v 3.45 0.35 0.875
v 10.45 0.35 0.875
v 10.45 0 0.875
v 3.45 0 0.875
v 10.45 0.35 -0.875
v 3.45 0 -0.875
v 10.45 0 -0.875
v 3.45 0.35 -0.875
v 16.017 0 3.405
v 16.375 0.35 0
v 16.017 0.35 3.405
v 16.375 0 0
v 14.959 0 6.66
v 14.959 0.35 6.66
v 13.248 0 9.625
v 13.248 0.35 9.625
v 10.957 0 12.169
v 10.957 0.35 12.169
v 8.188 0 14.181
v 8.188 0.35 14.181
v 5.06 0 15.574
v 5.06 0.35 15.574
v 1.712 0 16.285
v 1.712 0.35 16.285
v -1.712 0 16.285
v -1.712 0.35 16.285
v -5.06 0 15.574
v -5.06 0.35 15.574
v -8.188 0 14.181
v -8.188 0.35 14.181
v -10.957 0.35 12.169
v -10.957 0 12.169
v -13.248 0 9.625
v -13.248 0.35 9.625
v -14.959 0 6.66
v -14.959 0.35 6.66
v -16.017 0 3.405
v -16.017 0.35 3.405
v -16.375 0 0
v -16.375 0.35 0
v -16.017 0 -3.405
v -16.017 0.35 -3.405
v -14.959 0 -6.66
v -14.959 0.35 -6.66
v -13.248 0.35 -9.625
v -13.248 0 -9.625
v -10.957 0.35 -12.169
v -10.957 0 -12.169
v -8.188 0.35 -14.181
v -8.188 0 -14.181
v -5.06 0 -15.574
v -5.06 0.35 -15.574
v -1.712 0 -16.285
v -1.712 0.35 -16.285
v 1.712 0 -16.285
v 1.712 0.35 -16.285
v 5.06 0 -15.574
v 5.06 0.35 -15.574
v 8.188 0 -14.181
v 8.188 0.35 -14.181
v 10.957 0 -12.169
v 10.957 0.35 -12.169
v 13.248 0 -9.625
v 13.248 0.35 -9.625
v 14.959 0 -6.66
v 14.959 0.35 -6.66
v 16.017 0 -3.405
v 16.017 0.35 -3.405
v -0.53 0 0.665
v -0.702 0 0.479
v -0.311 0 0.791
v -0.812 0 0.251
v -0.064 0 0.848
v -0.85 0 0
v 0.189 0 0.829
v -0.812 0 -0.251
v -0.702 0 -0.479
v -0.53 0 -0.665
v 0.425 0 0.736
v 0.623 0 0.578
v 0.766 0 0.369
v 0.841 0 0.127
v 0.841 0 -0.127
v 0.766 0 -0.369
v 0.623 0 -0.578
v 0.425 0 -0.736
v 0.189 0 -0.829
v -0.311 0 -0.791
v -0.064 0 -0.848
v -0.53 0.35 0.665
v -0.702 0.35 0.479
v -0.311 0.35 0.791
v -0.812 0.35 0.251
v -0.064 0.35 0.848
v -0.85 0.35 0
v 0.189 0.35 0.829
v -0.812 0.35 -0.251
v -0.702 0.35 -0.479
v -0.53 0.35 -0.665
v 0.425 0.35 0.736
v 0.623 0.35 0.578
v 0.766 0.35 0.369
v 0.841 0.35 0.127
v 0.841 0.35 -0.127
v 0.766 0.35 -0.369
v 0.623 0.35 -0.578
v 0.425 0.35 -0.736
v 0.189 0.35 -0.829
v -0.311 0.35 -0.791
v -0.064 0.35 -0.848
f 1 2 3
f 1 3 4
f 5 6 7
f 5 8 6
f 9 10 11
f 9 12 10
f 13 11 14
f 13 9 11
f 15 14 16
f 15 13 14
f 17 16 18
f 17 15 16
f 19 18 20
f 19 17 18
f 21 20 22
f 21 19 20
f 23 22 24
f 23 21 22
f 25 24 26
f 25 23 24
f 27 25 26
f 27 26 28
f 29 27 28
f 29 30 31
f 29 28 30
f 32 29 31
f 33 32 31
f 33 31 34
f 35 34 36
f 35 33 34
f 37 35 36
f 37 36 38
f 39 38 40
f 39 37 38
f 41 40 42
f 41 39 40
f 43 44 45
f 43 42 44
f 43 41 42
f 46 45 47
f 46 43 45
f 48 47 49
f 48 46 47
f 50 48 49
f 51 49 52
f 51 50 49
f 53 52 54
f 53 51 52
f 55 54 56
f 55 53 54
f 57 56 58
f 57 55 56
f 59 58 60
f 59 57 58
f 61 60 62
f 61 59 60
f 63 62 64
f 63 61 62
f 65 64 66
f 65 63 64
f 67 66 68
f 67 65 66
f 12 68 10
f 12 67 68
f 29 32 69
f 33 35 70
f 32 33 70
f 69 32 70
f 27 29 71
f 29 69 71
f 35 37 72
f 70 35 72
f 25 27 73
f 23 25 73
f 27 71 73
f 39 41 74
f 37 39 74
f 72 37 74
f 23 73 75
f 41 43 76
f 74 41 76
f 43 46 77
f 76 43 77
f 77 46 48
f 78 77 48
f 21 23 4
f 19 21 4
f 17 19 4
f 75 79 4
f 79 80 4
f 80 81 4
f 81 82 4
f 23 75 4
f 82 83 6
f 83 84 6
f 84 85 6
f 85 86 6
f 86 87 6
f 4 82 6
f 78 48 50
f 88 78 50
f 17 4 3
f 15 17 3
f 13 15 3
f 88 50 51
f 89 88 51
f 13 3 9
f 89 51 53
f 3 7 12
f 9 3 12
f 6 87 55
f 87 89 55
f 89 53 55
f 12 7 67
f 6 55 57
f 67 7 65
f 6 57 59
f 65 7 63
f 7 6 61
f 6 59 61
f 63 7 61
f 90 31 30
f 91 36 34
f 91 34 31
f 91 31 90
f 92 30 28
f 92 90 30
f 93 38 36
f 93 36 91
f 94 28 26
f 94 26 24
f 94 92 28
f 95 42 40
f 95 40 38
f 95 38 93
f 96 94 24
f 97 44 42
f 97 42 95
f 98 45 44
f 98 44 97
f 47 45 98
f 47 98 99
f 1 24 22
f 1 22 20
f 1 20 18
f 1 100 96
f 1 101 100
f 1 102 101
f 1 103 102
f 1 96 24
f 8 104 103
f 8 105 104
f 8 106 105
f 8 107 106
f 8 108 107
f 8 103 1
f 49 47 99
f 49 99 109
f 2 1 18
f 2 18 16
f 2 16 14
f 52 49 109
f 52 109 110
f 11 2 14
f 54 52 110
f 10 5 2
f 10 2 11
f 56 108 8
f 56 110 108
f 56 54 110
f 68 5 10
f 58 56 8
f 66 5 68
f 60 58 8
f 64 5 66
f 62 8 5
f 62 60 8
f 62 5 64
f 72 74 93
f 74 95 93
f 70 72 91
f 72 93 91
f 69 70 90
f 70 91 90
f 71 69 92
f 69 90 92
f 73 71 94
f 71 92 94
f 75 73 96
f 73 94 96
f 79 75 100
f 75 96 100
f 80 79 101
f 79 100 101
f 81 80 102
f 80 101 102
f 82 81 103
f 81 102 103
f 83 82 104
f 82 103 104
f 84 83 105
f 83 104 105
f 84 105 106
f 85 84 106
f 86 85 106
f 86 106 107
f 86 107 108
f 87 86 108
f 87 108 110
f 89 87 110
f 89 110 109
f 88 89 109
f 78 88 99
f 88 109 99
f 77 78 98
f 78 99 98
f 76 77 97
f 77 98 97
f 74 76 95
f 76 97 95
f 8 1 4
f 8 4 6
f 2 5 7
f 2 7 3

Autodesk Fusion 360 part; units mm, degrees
sketch "Sketch4" plane through (0, 0, 0) normal (0, 1, 0) x (1, 0, 0)
  circle A0 centre (0, 0) radius 16.375
  dimension "d2" = 32.75
extrude "Extrude1" add sketch "Sketch4" along normal blind 0.35
sketch "Sketch5" plane through (0, 0.35, 0) normal (0, 1, 0) x (-1, 0, 0)
  circle A0 centre (0, 0) radius 16.375
  circle A1 centre (0, 0) radius 0.85
  line L0 (-3.45, -0.875) -> (-10.45, -0.875)
  line L1 (-10.45, -0.875) -> (-10.45, 0.875)
  line L2 (-10.45, 0.875) -> (-3.45, 0.875)
  line L3 (-3.45, 0.875) -> (-3.45, -0.875)
  dimension "d11" = 1.7
  dimension "d12" = 7
  dimension "d14" = 1.75
  dimension "d15" = 3.45
  dimension "d16" = 0.875
extrude "Extrude2" cut sketch "Sketch5" against normal through all contours A1 | L0 L1 L2 L3
sketch "Sketch7" plane through (0, 0.35, 0) normal (0, 1, 0) x (-1, 0, 0)
  circle A0 centre (0, 0) radius 0.85
  line L0 (-3.45, 0.875) -> (-3.45, -0.875)
  line L1 (-3.45, -0.875) -> (-10.45, -0.875)
  line L2 (-10.45, -0.875) -> (-10.45, 0.875)
  line L3 (-10.45, 0.875) -> (-3.45, 0.875)
  circle A1 centre (0, 0) radius 16.375
  line L4 (0.375, 12.5) -> (-0.375, 12.5)
  line L5 (-0.375, 12.5) -> (-0.375, 14.5)
  line L6 (-0.375, 14.5) -> (0.375, 14.5)
  line L7 (0.375, 14.5) -> (0.375, 12.5)
  circle A2 centre (0, 0) radius 15.5
  line L8 (-6.5748, 10.6378) -> (-7.5748, 12.3699)
  line L9 (-6.9252, 12.7449) -> (-5.9252, 11.0128)
  line L10 (-5.9252, 11.0128) -> (-6.5748, 10.6378)
  line L11 (-7.5748, 12.3699) -> (-6.9252, 12.7449)
  line L12 (-11.0128, 5.9252) -> (-12.7449, 6.9252)
  line L13 (-12.3699, 7.5748) -> (-10.6378, 6.5748)
  line L14 (-10.6378, 6.5748) -> (-11.0128, 5.9252)
  line L15 (-12.7449, 6.9252) -> (-12.3699, 7.5748)
  line L16 (-10.6378, -6.5748) -> (-12.3699, -7.5748)
  line L17 (-12.7449, -6.9252) -> (-11.0128, -5.9252)
  line L18 (-11.0128, -5.9252) -> (-10.6378, -6.5748)
  line L19 (-12.3699, -7.5748) -> (-12.7449, -6.9252)
  line L20 (-5.9252, -11.0128) -> (-6.9252, -12.7449)
  line L21 (-7.5748, -12.3699) -> (-6.5748, -10.6378)
  line L22 (-6.5748, -10.6378) -> (-5.9252, -11.0128)
  line L23 (-6.9252, -12.7449) -> (-7.5748, -12.3699)
  line L24 (6.5748, -10.6378) -> (7.5748, -12.3699)
  line L25 (6.9252, -12.7449) -> (5.9252, -11.0128)
  line L26 (5.9252, -11.0128) -> (6.5748, -10.6378)
  line L27 (7.5748, -12.3699) -> (6.9252, -12.7449)
  line L28 (11.0128, -5.9252) -> (12.7449, -6.9252)
  line L29 (12.3699, -7.5748) -> (10.6378, -6.5748)
  line L30 (10.6378, -6.5748) -> (11.0128, -5.9252)
  line L31 (12.7449, -6.9252) -> (12.3699, -7.5748)
  line L32 (10.6378, 6.5748) -> (12.3699, 7.5748)
  line L33 (12.7449, 6.9252) -> (11.0128, 5.9252)
  line L34 (11.0128, 5.9252) -> (10.6378, 6.5748)
  line L35 (12.3699, 7.5748) -> (12.7449, 6.9252)
  line L36 (5.9252, 11.0128) -> (6.9252, 12.7449)
  line L37 (7.5748, 12.3699) -> (6.5748, 10.6378)
  line L38 (6.5748, 10.6378) -> (5.9252, 11.0128)
  line L39 (6.9252, 12.7449) -> (7.5748, 12.3699)
  line L40 (0.75, -14.5) -> (-0.75, -14.5)
  line L41 (-0.75, -14.5) -> (0, -11.75)
  line L42 (0, -11.75) -> (0.75, -14.5)
  line L43 (0, -14.5) -> (0, -11.75)
  line L44 (-12.5, -0.375) -> (-14.5, -0.375)
  line L45 (-14.5, 0.375) -> (-12.5, 0.375)
  line L46 (-12.5, 0.375) -> (-12.5, -0.375)
  line L47 (-14.5, -0.375) -> (-14.5, 0.375)
  line L48 (12.5, 0.375) -> (14.5, 0.375)
  line L49 (14.5, -0.375) -> (12.5, -0.375)
  line L50 (12.5, -0.375) -> (12.5, 0.375)
  line L51 (14.5, 0.375) -> (14.5, -0.375)
  dimension "d20" = 0.75
  dimension "d21" = 2
  dimension "d24" = 31
  dimension "d26" = 0.375
  dimension "d31" = 2.75
  dimension "d32" = 1.5
  dimension "d33" = 0.75
  dimension "d34" = 14.5
  dimension "d35" = 14.5
sketch "Sketch8" plane through (0, 0.35, 0) normal (0, 1, 0) x (-1, 0, 0)
  circle A0 centre (0, 0) radius 0.85
  line L0 (-3.45, 0.875) -> (-3.45, -0.875)
  line L1 (-3.45, -0.875) -> (-10.45, -0.875)
  line L2 (-10.45, -0.875) -> (-10.45, 0.875)
  line L3 (-10.45, 0.875) -> (-3.45, 0.875)
  circle A1 centre (0, 0) radius 16.375
  line L4 (-5.4637, -8.2785) -> (-5.7091, -8.2785) construction
  line L5 (-5.7091, -8.2785) -> (-5.7091, -10.7785) construction
  line L6 (-5.7091, -10.7785) -> (-5.4637, -10.7785) construction
  line L7 (-5.4637, -10.7785) -> (-5.4637, -8.2785) construction
  line L8 (-9.0419, -4.7) -> (-9.8, -4.7) construction
  line L9 (-9.8, -4.7) -> (-9.8, -7.2) construction
  line L10 (-9.8, -7.2) -> (-9.0419, -7.2) construction
  line L11 (-9.0419, -7.2) -> (-9.0419, -4.7) construction
  line L12 (-11.1719, 1.0124) -> (-11.9349, 1.0124) construction
  line L13 (-11.9349, 1.0124) -> (-11.9349, -1.4876) construction
  line L14 (-11.9349, -1.4876) -> (-11.1719, -1.4876) construction
  line L15 (-11.1719, -1.4876) -> (-11.1719, 1.0124) construction
  line L16 (7.2613, -3.0997) -> (-7.3506, -3.0997) construction
  line L17 (-7.3506, -3.0997) -> (-7.3506, -6.0997) construction
  line L18 (-7.3506, -6.0997) -> (7.2613, -6.0997) construction
  line L19 (7.2613, -6.0997) -> (7.2613, -3.0997) construction
  line L20 (5.6532, -8.2) -> (4.9, -8.2) construction
  line L21 (4.9, -8.2) -> (4.9, -10.7) construction
  line L22 (4.9, -10.7) -> (5.6532, -10.7) construction
  line L23 (5.6532, -10.7) -> (5.6532, -8.2) construction
  line L24 (9.9968, -4.559) -> (8.654, -4.559) construction
  line L25 (8.654, -4.559) -> (8.654, -7.059) construction
  line L26 (8.654, -7.059) -> (9.9968, -7.059) construction
  line L27 (9.9968, -7.059) -> (9.9968, -4.559) construction
  line L28 (-9, 6.5) -> (-9.8447, 6.5) construction
  line L29 (-9.8447, 6.5) -> (-9.8447, 4) construction
  line L30 (-9.8447, 4) -> (-9, 4) construction
  line L31 (-9, 4) -> (-9, 6.5) construction
  line L32 (-5.2603, 10.2723) -> (-6, 10.2723) construction
  line L33 (-6, 10.2723) -> (-6, 7.7723) construction
  line L34 (-6, 7.7723) -> (-5.2603, 7.7723) construction
  line L35 (-5.2603, 7.7723) -> (-5.2603, 10.2723) construction
  line L36 (0.375, 11.567) -> (-0.3818, 11.567) construction
  line L37 (-0.3818, 11.567) -> (-0.3818, 9.067) construction
  line L38 (-0.3818, 9.067) -> (0.375, 9.067) construction
  line L39 (0.375, 9.067) -> (0.375, 11.567) construction
  line L40 (5.7526, 10.3802) -> (4.9958, 10.3802) construction
  line L41 (4.9958, 10.3802) -> (4.9958, 7.8802) construction
  line L42 (4.9958, 7.8802) -> (5.7526, 7.8802) construction
  line L43 (5.7526, 7.8802) -> (5.7526, 10.3802) construction
  line L44 (10, 6.5) -> (9.2249, 6.5) construction
  line L45 (9.2249, 6.5) -> (9.2249, 4) construction
  line L46 (9.2249, 4) -> (10, 4) construction
  line L47 (10, 4) -> (10, 6.5) construction
  line L48 (11.7568, 1) -> (11, 1) construction
  line L49 (11, 1) -> (11, -1.5) construction
  line L50 (11, -1.5) -> (11.7568, -1.5) construction
  line L51 (11.7568, -1.5) -> (11.7568, 1) construction
  line L52 (0.6011, -9.0275) -> (-0.6721, -9.0275) construction
  line L53 (-0.6721, -9.0275) -> (-0.6721, -11.5275) construction
  line L54 (-0.6721, -11.5275) -> (0.6011, -11.5275) construction
  line L55 (0.6011, -11.5275) -> (0.6011, -9.0275) construction
